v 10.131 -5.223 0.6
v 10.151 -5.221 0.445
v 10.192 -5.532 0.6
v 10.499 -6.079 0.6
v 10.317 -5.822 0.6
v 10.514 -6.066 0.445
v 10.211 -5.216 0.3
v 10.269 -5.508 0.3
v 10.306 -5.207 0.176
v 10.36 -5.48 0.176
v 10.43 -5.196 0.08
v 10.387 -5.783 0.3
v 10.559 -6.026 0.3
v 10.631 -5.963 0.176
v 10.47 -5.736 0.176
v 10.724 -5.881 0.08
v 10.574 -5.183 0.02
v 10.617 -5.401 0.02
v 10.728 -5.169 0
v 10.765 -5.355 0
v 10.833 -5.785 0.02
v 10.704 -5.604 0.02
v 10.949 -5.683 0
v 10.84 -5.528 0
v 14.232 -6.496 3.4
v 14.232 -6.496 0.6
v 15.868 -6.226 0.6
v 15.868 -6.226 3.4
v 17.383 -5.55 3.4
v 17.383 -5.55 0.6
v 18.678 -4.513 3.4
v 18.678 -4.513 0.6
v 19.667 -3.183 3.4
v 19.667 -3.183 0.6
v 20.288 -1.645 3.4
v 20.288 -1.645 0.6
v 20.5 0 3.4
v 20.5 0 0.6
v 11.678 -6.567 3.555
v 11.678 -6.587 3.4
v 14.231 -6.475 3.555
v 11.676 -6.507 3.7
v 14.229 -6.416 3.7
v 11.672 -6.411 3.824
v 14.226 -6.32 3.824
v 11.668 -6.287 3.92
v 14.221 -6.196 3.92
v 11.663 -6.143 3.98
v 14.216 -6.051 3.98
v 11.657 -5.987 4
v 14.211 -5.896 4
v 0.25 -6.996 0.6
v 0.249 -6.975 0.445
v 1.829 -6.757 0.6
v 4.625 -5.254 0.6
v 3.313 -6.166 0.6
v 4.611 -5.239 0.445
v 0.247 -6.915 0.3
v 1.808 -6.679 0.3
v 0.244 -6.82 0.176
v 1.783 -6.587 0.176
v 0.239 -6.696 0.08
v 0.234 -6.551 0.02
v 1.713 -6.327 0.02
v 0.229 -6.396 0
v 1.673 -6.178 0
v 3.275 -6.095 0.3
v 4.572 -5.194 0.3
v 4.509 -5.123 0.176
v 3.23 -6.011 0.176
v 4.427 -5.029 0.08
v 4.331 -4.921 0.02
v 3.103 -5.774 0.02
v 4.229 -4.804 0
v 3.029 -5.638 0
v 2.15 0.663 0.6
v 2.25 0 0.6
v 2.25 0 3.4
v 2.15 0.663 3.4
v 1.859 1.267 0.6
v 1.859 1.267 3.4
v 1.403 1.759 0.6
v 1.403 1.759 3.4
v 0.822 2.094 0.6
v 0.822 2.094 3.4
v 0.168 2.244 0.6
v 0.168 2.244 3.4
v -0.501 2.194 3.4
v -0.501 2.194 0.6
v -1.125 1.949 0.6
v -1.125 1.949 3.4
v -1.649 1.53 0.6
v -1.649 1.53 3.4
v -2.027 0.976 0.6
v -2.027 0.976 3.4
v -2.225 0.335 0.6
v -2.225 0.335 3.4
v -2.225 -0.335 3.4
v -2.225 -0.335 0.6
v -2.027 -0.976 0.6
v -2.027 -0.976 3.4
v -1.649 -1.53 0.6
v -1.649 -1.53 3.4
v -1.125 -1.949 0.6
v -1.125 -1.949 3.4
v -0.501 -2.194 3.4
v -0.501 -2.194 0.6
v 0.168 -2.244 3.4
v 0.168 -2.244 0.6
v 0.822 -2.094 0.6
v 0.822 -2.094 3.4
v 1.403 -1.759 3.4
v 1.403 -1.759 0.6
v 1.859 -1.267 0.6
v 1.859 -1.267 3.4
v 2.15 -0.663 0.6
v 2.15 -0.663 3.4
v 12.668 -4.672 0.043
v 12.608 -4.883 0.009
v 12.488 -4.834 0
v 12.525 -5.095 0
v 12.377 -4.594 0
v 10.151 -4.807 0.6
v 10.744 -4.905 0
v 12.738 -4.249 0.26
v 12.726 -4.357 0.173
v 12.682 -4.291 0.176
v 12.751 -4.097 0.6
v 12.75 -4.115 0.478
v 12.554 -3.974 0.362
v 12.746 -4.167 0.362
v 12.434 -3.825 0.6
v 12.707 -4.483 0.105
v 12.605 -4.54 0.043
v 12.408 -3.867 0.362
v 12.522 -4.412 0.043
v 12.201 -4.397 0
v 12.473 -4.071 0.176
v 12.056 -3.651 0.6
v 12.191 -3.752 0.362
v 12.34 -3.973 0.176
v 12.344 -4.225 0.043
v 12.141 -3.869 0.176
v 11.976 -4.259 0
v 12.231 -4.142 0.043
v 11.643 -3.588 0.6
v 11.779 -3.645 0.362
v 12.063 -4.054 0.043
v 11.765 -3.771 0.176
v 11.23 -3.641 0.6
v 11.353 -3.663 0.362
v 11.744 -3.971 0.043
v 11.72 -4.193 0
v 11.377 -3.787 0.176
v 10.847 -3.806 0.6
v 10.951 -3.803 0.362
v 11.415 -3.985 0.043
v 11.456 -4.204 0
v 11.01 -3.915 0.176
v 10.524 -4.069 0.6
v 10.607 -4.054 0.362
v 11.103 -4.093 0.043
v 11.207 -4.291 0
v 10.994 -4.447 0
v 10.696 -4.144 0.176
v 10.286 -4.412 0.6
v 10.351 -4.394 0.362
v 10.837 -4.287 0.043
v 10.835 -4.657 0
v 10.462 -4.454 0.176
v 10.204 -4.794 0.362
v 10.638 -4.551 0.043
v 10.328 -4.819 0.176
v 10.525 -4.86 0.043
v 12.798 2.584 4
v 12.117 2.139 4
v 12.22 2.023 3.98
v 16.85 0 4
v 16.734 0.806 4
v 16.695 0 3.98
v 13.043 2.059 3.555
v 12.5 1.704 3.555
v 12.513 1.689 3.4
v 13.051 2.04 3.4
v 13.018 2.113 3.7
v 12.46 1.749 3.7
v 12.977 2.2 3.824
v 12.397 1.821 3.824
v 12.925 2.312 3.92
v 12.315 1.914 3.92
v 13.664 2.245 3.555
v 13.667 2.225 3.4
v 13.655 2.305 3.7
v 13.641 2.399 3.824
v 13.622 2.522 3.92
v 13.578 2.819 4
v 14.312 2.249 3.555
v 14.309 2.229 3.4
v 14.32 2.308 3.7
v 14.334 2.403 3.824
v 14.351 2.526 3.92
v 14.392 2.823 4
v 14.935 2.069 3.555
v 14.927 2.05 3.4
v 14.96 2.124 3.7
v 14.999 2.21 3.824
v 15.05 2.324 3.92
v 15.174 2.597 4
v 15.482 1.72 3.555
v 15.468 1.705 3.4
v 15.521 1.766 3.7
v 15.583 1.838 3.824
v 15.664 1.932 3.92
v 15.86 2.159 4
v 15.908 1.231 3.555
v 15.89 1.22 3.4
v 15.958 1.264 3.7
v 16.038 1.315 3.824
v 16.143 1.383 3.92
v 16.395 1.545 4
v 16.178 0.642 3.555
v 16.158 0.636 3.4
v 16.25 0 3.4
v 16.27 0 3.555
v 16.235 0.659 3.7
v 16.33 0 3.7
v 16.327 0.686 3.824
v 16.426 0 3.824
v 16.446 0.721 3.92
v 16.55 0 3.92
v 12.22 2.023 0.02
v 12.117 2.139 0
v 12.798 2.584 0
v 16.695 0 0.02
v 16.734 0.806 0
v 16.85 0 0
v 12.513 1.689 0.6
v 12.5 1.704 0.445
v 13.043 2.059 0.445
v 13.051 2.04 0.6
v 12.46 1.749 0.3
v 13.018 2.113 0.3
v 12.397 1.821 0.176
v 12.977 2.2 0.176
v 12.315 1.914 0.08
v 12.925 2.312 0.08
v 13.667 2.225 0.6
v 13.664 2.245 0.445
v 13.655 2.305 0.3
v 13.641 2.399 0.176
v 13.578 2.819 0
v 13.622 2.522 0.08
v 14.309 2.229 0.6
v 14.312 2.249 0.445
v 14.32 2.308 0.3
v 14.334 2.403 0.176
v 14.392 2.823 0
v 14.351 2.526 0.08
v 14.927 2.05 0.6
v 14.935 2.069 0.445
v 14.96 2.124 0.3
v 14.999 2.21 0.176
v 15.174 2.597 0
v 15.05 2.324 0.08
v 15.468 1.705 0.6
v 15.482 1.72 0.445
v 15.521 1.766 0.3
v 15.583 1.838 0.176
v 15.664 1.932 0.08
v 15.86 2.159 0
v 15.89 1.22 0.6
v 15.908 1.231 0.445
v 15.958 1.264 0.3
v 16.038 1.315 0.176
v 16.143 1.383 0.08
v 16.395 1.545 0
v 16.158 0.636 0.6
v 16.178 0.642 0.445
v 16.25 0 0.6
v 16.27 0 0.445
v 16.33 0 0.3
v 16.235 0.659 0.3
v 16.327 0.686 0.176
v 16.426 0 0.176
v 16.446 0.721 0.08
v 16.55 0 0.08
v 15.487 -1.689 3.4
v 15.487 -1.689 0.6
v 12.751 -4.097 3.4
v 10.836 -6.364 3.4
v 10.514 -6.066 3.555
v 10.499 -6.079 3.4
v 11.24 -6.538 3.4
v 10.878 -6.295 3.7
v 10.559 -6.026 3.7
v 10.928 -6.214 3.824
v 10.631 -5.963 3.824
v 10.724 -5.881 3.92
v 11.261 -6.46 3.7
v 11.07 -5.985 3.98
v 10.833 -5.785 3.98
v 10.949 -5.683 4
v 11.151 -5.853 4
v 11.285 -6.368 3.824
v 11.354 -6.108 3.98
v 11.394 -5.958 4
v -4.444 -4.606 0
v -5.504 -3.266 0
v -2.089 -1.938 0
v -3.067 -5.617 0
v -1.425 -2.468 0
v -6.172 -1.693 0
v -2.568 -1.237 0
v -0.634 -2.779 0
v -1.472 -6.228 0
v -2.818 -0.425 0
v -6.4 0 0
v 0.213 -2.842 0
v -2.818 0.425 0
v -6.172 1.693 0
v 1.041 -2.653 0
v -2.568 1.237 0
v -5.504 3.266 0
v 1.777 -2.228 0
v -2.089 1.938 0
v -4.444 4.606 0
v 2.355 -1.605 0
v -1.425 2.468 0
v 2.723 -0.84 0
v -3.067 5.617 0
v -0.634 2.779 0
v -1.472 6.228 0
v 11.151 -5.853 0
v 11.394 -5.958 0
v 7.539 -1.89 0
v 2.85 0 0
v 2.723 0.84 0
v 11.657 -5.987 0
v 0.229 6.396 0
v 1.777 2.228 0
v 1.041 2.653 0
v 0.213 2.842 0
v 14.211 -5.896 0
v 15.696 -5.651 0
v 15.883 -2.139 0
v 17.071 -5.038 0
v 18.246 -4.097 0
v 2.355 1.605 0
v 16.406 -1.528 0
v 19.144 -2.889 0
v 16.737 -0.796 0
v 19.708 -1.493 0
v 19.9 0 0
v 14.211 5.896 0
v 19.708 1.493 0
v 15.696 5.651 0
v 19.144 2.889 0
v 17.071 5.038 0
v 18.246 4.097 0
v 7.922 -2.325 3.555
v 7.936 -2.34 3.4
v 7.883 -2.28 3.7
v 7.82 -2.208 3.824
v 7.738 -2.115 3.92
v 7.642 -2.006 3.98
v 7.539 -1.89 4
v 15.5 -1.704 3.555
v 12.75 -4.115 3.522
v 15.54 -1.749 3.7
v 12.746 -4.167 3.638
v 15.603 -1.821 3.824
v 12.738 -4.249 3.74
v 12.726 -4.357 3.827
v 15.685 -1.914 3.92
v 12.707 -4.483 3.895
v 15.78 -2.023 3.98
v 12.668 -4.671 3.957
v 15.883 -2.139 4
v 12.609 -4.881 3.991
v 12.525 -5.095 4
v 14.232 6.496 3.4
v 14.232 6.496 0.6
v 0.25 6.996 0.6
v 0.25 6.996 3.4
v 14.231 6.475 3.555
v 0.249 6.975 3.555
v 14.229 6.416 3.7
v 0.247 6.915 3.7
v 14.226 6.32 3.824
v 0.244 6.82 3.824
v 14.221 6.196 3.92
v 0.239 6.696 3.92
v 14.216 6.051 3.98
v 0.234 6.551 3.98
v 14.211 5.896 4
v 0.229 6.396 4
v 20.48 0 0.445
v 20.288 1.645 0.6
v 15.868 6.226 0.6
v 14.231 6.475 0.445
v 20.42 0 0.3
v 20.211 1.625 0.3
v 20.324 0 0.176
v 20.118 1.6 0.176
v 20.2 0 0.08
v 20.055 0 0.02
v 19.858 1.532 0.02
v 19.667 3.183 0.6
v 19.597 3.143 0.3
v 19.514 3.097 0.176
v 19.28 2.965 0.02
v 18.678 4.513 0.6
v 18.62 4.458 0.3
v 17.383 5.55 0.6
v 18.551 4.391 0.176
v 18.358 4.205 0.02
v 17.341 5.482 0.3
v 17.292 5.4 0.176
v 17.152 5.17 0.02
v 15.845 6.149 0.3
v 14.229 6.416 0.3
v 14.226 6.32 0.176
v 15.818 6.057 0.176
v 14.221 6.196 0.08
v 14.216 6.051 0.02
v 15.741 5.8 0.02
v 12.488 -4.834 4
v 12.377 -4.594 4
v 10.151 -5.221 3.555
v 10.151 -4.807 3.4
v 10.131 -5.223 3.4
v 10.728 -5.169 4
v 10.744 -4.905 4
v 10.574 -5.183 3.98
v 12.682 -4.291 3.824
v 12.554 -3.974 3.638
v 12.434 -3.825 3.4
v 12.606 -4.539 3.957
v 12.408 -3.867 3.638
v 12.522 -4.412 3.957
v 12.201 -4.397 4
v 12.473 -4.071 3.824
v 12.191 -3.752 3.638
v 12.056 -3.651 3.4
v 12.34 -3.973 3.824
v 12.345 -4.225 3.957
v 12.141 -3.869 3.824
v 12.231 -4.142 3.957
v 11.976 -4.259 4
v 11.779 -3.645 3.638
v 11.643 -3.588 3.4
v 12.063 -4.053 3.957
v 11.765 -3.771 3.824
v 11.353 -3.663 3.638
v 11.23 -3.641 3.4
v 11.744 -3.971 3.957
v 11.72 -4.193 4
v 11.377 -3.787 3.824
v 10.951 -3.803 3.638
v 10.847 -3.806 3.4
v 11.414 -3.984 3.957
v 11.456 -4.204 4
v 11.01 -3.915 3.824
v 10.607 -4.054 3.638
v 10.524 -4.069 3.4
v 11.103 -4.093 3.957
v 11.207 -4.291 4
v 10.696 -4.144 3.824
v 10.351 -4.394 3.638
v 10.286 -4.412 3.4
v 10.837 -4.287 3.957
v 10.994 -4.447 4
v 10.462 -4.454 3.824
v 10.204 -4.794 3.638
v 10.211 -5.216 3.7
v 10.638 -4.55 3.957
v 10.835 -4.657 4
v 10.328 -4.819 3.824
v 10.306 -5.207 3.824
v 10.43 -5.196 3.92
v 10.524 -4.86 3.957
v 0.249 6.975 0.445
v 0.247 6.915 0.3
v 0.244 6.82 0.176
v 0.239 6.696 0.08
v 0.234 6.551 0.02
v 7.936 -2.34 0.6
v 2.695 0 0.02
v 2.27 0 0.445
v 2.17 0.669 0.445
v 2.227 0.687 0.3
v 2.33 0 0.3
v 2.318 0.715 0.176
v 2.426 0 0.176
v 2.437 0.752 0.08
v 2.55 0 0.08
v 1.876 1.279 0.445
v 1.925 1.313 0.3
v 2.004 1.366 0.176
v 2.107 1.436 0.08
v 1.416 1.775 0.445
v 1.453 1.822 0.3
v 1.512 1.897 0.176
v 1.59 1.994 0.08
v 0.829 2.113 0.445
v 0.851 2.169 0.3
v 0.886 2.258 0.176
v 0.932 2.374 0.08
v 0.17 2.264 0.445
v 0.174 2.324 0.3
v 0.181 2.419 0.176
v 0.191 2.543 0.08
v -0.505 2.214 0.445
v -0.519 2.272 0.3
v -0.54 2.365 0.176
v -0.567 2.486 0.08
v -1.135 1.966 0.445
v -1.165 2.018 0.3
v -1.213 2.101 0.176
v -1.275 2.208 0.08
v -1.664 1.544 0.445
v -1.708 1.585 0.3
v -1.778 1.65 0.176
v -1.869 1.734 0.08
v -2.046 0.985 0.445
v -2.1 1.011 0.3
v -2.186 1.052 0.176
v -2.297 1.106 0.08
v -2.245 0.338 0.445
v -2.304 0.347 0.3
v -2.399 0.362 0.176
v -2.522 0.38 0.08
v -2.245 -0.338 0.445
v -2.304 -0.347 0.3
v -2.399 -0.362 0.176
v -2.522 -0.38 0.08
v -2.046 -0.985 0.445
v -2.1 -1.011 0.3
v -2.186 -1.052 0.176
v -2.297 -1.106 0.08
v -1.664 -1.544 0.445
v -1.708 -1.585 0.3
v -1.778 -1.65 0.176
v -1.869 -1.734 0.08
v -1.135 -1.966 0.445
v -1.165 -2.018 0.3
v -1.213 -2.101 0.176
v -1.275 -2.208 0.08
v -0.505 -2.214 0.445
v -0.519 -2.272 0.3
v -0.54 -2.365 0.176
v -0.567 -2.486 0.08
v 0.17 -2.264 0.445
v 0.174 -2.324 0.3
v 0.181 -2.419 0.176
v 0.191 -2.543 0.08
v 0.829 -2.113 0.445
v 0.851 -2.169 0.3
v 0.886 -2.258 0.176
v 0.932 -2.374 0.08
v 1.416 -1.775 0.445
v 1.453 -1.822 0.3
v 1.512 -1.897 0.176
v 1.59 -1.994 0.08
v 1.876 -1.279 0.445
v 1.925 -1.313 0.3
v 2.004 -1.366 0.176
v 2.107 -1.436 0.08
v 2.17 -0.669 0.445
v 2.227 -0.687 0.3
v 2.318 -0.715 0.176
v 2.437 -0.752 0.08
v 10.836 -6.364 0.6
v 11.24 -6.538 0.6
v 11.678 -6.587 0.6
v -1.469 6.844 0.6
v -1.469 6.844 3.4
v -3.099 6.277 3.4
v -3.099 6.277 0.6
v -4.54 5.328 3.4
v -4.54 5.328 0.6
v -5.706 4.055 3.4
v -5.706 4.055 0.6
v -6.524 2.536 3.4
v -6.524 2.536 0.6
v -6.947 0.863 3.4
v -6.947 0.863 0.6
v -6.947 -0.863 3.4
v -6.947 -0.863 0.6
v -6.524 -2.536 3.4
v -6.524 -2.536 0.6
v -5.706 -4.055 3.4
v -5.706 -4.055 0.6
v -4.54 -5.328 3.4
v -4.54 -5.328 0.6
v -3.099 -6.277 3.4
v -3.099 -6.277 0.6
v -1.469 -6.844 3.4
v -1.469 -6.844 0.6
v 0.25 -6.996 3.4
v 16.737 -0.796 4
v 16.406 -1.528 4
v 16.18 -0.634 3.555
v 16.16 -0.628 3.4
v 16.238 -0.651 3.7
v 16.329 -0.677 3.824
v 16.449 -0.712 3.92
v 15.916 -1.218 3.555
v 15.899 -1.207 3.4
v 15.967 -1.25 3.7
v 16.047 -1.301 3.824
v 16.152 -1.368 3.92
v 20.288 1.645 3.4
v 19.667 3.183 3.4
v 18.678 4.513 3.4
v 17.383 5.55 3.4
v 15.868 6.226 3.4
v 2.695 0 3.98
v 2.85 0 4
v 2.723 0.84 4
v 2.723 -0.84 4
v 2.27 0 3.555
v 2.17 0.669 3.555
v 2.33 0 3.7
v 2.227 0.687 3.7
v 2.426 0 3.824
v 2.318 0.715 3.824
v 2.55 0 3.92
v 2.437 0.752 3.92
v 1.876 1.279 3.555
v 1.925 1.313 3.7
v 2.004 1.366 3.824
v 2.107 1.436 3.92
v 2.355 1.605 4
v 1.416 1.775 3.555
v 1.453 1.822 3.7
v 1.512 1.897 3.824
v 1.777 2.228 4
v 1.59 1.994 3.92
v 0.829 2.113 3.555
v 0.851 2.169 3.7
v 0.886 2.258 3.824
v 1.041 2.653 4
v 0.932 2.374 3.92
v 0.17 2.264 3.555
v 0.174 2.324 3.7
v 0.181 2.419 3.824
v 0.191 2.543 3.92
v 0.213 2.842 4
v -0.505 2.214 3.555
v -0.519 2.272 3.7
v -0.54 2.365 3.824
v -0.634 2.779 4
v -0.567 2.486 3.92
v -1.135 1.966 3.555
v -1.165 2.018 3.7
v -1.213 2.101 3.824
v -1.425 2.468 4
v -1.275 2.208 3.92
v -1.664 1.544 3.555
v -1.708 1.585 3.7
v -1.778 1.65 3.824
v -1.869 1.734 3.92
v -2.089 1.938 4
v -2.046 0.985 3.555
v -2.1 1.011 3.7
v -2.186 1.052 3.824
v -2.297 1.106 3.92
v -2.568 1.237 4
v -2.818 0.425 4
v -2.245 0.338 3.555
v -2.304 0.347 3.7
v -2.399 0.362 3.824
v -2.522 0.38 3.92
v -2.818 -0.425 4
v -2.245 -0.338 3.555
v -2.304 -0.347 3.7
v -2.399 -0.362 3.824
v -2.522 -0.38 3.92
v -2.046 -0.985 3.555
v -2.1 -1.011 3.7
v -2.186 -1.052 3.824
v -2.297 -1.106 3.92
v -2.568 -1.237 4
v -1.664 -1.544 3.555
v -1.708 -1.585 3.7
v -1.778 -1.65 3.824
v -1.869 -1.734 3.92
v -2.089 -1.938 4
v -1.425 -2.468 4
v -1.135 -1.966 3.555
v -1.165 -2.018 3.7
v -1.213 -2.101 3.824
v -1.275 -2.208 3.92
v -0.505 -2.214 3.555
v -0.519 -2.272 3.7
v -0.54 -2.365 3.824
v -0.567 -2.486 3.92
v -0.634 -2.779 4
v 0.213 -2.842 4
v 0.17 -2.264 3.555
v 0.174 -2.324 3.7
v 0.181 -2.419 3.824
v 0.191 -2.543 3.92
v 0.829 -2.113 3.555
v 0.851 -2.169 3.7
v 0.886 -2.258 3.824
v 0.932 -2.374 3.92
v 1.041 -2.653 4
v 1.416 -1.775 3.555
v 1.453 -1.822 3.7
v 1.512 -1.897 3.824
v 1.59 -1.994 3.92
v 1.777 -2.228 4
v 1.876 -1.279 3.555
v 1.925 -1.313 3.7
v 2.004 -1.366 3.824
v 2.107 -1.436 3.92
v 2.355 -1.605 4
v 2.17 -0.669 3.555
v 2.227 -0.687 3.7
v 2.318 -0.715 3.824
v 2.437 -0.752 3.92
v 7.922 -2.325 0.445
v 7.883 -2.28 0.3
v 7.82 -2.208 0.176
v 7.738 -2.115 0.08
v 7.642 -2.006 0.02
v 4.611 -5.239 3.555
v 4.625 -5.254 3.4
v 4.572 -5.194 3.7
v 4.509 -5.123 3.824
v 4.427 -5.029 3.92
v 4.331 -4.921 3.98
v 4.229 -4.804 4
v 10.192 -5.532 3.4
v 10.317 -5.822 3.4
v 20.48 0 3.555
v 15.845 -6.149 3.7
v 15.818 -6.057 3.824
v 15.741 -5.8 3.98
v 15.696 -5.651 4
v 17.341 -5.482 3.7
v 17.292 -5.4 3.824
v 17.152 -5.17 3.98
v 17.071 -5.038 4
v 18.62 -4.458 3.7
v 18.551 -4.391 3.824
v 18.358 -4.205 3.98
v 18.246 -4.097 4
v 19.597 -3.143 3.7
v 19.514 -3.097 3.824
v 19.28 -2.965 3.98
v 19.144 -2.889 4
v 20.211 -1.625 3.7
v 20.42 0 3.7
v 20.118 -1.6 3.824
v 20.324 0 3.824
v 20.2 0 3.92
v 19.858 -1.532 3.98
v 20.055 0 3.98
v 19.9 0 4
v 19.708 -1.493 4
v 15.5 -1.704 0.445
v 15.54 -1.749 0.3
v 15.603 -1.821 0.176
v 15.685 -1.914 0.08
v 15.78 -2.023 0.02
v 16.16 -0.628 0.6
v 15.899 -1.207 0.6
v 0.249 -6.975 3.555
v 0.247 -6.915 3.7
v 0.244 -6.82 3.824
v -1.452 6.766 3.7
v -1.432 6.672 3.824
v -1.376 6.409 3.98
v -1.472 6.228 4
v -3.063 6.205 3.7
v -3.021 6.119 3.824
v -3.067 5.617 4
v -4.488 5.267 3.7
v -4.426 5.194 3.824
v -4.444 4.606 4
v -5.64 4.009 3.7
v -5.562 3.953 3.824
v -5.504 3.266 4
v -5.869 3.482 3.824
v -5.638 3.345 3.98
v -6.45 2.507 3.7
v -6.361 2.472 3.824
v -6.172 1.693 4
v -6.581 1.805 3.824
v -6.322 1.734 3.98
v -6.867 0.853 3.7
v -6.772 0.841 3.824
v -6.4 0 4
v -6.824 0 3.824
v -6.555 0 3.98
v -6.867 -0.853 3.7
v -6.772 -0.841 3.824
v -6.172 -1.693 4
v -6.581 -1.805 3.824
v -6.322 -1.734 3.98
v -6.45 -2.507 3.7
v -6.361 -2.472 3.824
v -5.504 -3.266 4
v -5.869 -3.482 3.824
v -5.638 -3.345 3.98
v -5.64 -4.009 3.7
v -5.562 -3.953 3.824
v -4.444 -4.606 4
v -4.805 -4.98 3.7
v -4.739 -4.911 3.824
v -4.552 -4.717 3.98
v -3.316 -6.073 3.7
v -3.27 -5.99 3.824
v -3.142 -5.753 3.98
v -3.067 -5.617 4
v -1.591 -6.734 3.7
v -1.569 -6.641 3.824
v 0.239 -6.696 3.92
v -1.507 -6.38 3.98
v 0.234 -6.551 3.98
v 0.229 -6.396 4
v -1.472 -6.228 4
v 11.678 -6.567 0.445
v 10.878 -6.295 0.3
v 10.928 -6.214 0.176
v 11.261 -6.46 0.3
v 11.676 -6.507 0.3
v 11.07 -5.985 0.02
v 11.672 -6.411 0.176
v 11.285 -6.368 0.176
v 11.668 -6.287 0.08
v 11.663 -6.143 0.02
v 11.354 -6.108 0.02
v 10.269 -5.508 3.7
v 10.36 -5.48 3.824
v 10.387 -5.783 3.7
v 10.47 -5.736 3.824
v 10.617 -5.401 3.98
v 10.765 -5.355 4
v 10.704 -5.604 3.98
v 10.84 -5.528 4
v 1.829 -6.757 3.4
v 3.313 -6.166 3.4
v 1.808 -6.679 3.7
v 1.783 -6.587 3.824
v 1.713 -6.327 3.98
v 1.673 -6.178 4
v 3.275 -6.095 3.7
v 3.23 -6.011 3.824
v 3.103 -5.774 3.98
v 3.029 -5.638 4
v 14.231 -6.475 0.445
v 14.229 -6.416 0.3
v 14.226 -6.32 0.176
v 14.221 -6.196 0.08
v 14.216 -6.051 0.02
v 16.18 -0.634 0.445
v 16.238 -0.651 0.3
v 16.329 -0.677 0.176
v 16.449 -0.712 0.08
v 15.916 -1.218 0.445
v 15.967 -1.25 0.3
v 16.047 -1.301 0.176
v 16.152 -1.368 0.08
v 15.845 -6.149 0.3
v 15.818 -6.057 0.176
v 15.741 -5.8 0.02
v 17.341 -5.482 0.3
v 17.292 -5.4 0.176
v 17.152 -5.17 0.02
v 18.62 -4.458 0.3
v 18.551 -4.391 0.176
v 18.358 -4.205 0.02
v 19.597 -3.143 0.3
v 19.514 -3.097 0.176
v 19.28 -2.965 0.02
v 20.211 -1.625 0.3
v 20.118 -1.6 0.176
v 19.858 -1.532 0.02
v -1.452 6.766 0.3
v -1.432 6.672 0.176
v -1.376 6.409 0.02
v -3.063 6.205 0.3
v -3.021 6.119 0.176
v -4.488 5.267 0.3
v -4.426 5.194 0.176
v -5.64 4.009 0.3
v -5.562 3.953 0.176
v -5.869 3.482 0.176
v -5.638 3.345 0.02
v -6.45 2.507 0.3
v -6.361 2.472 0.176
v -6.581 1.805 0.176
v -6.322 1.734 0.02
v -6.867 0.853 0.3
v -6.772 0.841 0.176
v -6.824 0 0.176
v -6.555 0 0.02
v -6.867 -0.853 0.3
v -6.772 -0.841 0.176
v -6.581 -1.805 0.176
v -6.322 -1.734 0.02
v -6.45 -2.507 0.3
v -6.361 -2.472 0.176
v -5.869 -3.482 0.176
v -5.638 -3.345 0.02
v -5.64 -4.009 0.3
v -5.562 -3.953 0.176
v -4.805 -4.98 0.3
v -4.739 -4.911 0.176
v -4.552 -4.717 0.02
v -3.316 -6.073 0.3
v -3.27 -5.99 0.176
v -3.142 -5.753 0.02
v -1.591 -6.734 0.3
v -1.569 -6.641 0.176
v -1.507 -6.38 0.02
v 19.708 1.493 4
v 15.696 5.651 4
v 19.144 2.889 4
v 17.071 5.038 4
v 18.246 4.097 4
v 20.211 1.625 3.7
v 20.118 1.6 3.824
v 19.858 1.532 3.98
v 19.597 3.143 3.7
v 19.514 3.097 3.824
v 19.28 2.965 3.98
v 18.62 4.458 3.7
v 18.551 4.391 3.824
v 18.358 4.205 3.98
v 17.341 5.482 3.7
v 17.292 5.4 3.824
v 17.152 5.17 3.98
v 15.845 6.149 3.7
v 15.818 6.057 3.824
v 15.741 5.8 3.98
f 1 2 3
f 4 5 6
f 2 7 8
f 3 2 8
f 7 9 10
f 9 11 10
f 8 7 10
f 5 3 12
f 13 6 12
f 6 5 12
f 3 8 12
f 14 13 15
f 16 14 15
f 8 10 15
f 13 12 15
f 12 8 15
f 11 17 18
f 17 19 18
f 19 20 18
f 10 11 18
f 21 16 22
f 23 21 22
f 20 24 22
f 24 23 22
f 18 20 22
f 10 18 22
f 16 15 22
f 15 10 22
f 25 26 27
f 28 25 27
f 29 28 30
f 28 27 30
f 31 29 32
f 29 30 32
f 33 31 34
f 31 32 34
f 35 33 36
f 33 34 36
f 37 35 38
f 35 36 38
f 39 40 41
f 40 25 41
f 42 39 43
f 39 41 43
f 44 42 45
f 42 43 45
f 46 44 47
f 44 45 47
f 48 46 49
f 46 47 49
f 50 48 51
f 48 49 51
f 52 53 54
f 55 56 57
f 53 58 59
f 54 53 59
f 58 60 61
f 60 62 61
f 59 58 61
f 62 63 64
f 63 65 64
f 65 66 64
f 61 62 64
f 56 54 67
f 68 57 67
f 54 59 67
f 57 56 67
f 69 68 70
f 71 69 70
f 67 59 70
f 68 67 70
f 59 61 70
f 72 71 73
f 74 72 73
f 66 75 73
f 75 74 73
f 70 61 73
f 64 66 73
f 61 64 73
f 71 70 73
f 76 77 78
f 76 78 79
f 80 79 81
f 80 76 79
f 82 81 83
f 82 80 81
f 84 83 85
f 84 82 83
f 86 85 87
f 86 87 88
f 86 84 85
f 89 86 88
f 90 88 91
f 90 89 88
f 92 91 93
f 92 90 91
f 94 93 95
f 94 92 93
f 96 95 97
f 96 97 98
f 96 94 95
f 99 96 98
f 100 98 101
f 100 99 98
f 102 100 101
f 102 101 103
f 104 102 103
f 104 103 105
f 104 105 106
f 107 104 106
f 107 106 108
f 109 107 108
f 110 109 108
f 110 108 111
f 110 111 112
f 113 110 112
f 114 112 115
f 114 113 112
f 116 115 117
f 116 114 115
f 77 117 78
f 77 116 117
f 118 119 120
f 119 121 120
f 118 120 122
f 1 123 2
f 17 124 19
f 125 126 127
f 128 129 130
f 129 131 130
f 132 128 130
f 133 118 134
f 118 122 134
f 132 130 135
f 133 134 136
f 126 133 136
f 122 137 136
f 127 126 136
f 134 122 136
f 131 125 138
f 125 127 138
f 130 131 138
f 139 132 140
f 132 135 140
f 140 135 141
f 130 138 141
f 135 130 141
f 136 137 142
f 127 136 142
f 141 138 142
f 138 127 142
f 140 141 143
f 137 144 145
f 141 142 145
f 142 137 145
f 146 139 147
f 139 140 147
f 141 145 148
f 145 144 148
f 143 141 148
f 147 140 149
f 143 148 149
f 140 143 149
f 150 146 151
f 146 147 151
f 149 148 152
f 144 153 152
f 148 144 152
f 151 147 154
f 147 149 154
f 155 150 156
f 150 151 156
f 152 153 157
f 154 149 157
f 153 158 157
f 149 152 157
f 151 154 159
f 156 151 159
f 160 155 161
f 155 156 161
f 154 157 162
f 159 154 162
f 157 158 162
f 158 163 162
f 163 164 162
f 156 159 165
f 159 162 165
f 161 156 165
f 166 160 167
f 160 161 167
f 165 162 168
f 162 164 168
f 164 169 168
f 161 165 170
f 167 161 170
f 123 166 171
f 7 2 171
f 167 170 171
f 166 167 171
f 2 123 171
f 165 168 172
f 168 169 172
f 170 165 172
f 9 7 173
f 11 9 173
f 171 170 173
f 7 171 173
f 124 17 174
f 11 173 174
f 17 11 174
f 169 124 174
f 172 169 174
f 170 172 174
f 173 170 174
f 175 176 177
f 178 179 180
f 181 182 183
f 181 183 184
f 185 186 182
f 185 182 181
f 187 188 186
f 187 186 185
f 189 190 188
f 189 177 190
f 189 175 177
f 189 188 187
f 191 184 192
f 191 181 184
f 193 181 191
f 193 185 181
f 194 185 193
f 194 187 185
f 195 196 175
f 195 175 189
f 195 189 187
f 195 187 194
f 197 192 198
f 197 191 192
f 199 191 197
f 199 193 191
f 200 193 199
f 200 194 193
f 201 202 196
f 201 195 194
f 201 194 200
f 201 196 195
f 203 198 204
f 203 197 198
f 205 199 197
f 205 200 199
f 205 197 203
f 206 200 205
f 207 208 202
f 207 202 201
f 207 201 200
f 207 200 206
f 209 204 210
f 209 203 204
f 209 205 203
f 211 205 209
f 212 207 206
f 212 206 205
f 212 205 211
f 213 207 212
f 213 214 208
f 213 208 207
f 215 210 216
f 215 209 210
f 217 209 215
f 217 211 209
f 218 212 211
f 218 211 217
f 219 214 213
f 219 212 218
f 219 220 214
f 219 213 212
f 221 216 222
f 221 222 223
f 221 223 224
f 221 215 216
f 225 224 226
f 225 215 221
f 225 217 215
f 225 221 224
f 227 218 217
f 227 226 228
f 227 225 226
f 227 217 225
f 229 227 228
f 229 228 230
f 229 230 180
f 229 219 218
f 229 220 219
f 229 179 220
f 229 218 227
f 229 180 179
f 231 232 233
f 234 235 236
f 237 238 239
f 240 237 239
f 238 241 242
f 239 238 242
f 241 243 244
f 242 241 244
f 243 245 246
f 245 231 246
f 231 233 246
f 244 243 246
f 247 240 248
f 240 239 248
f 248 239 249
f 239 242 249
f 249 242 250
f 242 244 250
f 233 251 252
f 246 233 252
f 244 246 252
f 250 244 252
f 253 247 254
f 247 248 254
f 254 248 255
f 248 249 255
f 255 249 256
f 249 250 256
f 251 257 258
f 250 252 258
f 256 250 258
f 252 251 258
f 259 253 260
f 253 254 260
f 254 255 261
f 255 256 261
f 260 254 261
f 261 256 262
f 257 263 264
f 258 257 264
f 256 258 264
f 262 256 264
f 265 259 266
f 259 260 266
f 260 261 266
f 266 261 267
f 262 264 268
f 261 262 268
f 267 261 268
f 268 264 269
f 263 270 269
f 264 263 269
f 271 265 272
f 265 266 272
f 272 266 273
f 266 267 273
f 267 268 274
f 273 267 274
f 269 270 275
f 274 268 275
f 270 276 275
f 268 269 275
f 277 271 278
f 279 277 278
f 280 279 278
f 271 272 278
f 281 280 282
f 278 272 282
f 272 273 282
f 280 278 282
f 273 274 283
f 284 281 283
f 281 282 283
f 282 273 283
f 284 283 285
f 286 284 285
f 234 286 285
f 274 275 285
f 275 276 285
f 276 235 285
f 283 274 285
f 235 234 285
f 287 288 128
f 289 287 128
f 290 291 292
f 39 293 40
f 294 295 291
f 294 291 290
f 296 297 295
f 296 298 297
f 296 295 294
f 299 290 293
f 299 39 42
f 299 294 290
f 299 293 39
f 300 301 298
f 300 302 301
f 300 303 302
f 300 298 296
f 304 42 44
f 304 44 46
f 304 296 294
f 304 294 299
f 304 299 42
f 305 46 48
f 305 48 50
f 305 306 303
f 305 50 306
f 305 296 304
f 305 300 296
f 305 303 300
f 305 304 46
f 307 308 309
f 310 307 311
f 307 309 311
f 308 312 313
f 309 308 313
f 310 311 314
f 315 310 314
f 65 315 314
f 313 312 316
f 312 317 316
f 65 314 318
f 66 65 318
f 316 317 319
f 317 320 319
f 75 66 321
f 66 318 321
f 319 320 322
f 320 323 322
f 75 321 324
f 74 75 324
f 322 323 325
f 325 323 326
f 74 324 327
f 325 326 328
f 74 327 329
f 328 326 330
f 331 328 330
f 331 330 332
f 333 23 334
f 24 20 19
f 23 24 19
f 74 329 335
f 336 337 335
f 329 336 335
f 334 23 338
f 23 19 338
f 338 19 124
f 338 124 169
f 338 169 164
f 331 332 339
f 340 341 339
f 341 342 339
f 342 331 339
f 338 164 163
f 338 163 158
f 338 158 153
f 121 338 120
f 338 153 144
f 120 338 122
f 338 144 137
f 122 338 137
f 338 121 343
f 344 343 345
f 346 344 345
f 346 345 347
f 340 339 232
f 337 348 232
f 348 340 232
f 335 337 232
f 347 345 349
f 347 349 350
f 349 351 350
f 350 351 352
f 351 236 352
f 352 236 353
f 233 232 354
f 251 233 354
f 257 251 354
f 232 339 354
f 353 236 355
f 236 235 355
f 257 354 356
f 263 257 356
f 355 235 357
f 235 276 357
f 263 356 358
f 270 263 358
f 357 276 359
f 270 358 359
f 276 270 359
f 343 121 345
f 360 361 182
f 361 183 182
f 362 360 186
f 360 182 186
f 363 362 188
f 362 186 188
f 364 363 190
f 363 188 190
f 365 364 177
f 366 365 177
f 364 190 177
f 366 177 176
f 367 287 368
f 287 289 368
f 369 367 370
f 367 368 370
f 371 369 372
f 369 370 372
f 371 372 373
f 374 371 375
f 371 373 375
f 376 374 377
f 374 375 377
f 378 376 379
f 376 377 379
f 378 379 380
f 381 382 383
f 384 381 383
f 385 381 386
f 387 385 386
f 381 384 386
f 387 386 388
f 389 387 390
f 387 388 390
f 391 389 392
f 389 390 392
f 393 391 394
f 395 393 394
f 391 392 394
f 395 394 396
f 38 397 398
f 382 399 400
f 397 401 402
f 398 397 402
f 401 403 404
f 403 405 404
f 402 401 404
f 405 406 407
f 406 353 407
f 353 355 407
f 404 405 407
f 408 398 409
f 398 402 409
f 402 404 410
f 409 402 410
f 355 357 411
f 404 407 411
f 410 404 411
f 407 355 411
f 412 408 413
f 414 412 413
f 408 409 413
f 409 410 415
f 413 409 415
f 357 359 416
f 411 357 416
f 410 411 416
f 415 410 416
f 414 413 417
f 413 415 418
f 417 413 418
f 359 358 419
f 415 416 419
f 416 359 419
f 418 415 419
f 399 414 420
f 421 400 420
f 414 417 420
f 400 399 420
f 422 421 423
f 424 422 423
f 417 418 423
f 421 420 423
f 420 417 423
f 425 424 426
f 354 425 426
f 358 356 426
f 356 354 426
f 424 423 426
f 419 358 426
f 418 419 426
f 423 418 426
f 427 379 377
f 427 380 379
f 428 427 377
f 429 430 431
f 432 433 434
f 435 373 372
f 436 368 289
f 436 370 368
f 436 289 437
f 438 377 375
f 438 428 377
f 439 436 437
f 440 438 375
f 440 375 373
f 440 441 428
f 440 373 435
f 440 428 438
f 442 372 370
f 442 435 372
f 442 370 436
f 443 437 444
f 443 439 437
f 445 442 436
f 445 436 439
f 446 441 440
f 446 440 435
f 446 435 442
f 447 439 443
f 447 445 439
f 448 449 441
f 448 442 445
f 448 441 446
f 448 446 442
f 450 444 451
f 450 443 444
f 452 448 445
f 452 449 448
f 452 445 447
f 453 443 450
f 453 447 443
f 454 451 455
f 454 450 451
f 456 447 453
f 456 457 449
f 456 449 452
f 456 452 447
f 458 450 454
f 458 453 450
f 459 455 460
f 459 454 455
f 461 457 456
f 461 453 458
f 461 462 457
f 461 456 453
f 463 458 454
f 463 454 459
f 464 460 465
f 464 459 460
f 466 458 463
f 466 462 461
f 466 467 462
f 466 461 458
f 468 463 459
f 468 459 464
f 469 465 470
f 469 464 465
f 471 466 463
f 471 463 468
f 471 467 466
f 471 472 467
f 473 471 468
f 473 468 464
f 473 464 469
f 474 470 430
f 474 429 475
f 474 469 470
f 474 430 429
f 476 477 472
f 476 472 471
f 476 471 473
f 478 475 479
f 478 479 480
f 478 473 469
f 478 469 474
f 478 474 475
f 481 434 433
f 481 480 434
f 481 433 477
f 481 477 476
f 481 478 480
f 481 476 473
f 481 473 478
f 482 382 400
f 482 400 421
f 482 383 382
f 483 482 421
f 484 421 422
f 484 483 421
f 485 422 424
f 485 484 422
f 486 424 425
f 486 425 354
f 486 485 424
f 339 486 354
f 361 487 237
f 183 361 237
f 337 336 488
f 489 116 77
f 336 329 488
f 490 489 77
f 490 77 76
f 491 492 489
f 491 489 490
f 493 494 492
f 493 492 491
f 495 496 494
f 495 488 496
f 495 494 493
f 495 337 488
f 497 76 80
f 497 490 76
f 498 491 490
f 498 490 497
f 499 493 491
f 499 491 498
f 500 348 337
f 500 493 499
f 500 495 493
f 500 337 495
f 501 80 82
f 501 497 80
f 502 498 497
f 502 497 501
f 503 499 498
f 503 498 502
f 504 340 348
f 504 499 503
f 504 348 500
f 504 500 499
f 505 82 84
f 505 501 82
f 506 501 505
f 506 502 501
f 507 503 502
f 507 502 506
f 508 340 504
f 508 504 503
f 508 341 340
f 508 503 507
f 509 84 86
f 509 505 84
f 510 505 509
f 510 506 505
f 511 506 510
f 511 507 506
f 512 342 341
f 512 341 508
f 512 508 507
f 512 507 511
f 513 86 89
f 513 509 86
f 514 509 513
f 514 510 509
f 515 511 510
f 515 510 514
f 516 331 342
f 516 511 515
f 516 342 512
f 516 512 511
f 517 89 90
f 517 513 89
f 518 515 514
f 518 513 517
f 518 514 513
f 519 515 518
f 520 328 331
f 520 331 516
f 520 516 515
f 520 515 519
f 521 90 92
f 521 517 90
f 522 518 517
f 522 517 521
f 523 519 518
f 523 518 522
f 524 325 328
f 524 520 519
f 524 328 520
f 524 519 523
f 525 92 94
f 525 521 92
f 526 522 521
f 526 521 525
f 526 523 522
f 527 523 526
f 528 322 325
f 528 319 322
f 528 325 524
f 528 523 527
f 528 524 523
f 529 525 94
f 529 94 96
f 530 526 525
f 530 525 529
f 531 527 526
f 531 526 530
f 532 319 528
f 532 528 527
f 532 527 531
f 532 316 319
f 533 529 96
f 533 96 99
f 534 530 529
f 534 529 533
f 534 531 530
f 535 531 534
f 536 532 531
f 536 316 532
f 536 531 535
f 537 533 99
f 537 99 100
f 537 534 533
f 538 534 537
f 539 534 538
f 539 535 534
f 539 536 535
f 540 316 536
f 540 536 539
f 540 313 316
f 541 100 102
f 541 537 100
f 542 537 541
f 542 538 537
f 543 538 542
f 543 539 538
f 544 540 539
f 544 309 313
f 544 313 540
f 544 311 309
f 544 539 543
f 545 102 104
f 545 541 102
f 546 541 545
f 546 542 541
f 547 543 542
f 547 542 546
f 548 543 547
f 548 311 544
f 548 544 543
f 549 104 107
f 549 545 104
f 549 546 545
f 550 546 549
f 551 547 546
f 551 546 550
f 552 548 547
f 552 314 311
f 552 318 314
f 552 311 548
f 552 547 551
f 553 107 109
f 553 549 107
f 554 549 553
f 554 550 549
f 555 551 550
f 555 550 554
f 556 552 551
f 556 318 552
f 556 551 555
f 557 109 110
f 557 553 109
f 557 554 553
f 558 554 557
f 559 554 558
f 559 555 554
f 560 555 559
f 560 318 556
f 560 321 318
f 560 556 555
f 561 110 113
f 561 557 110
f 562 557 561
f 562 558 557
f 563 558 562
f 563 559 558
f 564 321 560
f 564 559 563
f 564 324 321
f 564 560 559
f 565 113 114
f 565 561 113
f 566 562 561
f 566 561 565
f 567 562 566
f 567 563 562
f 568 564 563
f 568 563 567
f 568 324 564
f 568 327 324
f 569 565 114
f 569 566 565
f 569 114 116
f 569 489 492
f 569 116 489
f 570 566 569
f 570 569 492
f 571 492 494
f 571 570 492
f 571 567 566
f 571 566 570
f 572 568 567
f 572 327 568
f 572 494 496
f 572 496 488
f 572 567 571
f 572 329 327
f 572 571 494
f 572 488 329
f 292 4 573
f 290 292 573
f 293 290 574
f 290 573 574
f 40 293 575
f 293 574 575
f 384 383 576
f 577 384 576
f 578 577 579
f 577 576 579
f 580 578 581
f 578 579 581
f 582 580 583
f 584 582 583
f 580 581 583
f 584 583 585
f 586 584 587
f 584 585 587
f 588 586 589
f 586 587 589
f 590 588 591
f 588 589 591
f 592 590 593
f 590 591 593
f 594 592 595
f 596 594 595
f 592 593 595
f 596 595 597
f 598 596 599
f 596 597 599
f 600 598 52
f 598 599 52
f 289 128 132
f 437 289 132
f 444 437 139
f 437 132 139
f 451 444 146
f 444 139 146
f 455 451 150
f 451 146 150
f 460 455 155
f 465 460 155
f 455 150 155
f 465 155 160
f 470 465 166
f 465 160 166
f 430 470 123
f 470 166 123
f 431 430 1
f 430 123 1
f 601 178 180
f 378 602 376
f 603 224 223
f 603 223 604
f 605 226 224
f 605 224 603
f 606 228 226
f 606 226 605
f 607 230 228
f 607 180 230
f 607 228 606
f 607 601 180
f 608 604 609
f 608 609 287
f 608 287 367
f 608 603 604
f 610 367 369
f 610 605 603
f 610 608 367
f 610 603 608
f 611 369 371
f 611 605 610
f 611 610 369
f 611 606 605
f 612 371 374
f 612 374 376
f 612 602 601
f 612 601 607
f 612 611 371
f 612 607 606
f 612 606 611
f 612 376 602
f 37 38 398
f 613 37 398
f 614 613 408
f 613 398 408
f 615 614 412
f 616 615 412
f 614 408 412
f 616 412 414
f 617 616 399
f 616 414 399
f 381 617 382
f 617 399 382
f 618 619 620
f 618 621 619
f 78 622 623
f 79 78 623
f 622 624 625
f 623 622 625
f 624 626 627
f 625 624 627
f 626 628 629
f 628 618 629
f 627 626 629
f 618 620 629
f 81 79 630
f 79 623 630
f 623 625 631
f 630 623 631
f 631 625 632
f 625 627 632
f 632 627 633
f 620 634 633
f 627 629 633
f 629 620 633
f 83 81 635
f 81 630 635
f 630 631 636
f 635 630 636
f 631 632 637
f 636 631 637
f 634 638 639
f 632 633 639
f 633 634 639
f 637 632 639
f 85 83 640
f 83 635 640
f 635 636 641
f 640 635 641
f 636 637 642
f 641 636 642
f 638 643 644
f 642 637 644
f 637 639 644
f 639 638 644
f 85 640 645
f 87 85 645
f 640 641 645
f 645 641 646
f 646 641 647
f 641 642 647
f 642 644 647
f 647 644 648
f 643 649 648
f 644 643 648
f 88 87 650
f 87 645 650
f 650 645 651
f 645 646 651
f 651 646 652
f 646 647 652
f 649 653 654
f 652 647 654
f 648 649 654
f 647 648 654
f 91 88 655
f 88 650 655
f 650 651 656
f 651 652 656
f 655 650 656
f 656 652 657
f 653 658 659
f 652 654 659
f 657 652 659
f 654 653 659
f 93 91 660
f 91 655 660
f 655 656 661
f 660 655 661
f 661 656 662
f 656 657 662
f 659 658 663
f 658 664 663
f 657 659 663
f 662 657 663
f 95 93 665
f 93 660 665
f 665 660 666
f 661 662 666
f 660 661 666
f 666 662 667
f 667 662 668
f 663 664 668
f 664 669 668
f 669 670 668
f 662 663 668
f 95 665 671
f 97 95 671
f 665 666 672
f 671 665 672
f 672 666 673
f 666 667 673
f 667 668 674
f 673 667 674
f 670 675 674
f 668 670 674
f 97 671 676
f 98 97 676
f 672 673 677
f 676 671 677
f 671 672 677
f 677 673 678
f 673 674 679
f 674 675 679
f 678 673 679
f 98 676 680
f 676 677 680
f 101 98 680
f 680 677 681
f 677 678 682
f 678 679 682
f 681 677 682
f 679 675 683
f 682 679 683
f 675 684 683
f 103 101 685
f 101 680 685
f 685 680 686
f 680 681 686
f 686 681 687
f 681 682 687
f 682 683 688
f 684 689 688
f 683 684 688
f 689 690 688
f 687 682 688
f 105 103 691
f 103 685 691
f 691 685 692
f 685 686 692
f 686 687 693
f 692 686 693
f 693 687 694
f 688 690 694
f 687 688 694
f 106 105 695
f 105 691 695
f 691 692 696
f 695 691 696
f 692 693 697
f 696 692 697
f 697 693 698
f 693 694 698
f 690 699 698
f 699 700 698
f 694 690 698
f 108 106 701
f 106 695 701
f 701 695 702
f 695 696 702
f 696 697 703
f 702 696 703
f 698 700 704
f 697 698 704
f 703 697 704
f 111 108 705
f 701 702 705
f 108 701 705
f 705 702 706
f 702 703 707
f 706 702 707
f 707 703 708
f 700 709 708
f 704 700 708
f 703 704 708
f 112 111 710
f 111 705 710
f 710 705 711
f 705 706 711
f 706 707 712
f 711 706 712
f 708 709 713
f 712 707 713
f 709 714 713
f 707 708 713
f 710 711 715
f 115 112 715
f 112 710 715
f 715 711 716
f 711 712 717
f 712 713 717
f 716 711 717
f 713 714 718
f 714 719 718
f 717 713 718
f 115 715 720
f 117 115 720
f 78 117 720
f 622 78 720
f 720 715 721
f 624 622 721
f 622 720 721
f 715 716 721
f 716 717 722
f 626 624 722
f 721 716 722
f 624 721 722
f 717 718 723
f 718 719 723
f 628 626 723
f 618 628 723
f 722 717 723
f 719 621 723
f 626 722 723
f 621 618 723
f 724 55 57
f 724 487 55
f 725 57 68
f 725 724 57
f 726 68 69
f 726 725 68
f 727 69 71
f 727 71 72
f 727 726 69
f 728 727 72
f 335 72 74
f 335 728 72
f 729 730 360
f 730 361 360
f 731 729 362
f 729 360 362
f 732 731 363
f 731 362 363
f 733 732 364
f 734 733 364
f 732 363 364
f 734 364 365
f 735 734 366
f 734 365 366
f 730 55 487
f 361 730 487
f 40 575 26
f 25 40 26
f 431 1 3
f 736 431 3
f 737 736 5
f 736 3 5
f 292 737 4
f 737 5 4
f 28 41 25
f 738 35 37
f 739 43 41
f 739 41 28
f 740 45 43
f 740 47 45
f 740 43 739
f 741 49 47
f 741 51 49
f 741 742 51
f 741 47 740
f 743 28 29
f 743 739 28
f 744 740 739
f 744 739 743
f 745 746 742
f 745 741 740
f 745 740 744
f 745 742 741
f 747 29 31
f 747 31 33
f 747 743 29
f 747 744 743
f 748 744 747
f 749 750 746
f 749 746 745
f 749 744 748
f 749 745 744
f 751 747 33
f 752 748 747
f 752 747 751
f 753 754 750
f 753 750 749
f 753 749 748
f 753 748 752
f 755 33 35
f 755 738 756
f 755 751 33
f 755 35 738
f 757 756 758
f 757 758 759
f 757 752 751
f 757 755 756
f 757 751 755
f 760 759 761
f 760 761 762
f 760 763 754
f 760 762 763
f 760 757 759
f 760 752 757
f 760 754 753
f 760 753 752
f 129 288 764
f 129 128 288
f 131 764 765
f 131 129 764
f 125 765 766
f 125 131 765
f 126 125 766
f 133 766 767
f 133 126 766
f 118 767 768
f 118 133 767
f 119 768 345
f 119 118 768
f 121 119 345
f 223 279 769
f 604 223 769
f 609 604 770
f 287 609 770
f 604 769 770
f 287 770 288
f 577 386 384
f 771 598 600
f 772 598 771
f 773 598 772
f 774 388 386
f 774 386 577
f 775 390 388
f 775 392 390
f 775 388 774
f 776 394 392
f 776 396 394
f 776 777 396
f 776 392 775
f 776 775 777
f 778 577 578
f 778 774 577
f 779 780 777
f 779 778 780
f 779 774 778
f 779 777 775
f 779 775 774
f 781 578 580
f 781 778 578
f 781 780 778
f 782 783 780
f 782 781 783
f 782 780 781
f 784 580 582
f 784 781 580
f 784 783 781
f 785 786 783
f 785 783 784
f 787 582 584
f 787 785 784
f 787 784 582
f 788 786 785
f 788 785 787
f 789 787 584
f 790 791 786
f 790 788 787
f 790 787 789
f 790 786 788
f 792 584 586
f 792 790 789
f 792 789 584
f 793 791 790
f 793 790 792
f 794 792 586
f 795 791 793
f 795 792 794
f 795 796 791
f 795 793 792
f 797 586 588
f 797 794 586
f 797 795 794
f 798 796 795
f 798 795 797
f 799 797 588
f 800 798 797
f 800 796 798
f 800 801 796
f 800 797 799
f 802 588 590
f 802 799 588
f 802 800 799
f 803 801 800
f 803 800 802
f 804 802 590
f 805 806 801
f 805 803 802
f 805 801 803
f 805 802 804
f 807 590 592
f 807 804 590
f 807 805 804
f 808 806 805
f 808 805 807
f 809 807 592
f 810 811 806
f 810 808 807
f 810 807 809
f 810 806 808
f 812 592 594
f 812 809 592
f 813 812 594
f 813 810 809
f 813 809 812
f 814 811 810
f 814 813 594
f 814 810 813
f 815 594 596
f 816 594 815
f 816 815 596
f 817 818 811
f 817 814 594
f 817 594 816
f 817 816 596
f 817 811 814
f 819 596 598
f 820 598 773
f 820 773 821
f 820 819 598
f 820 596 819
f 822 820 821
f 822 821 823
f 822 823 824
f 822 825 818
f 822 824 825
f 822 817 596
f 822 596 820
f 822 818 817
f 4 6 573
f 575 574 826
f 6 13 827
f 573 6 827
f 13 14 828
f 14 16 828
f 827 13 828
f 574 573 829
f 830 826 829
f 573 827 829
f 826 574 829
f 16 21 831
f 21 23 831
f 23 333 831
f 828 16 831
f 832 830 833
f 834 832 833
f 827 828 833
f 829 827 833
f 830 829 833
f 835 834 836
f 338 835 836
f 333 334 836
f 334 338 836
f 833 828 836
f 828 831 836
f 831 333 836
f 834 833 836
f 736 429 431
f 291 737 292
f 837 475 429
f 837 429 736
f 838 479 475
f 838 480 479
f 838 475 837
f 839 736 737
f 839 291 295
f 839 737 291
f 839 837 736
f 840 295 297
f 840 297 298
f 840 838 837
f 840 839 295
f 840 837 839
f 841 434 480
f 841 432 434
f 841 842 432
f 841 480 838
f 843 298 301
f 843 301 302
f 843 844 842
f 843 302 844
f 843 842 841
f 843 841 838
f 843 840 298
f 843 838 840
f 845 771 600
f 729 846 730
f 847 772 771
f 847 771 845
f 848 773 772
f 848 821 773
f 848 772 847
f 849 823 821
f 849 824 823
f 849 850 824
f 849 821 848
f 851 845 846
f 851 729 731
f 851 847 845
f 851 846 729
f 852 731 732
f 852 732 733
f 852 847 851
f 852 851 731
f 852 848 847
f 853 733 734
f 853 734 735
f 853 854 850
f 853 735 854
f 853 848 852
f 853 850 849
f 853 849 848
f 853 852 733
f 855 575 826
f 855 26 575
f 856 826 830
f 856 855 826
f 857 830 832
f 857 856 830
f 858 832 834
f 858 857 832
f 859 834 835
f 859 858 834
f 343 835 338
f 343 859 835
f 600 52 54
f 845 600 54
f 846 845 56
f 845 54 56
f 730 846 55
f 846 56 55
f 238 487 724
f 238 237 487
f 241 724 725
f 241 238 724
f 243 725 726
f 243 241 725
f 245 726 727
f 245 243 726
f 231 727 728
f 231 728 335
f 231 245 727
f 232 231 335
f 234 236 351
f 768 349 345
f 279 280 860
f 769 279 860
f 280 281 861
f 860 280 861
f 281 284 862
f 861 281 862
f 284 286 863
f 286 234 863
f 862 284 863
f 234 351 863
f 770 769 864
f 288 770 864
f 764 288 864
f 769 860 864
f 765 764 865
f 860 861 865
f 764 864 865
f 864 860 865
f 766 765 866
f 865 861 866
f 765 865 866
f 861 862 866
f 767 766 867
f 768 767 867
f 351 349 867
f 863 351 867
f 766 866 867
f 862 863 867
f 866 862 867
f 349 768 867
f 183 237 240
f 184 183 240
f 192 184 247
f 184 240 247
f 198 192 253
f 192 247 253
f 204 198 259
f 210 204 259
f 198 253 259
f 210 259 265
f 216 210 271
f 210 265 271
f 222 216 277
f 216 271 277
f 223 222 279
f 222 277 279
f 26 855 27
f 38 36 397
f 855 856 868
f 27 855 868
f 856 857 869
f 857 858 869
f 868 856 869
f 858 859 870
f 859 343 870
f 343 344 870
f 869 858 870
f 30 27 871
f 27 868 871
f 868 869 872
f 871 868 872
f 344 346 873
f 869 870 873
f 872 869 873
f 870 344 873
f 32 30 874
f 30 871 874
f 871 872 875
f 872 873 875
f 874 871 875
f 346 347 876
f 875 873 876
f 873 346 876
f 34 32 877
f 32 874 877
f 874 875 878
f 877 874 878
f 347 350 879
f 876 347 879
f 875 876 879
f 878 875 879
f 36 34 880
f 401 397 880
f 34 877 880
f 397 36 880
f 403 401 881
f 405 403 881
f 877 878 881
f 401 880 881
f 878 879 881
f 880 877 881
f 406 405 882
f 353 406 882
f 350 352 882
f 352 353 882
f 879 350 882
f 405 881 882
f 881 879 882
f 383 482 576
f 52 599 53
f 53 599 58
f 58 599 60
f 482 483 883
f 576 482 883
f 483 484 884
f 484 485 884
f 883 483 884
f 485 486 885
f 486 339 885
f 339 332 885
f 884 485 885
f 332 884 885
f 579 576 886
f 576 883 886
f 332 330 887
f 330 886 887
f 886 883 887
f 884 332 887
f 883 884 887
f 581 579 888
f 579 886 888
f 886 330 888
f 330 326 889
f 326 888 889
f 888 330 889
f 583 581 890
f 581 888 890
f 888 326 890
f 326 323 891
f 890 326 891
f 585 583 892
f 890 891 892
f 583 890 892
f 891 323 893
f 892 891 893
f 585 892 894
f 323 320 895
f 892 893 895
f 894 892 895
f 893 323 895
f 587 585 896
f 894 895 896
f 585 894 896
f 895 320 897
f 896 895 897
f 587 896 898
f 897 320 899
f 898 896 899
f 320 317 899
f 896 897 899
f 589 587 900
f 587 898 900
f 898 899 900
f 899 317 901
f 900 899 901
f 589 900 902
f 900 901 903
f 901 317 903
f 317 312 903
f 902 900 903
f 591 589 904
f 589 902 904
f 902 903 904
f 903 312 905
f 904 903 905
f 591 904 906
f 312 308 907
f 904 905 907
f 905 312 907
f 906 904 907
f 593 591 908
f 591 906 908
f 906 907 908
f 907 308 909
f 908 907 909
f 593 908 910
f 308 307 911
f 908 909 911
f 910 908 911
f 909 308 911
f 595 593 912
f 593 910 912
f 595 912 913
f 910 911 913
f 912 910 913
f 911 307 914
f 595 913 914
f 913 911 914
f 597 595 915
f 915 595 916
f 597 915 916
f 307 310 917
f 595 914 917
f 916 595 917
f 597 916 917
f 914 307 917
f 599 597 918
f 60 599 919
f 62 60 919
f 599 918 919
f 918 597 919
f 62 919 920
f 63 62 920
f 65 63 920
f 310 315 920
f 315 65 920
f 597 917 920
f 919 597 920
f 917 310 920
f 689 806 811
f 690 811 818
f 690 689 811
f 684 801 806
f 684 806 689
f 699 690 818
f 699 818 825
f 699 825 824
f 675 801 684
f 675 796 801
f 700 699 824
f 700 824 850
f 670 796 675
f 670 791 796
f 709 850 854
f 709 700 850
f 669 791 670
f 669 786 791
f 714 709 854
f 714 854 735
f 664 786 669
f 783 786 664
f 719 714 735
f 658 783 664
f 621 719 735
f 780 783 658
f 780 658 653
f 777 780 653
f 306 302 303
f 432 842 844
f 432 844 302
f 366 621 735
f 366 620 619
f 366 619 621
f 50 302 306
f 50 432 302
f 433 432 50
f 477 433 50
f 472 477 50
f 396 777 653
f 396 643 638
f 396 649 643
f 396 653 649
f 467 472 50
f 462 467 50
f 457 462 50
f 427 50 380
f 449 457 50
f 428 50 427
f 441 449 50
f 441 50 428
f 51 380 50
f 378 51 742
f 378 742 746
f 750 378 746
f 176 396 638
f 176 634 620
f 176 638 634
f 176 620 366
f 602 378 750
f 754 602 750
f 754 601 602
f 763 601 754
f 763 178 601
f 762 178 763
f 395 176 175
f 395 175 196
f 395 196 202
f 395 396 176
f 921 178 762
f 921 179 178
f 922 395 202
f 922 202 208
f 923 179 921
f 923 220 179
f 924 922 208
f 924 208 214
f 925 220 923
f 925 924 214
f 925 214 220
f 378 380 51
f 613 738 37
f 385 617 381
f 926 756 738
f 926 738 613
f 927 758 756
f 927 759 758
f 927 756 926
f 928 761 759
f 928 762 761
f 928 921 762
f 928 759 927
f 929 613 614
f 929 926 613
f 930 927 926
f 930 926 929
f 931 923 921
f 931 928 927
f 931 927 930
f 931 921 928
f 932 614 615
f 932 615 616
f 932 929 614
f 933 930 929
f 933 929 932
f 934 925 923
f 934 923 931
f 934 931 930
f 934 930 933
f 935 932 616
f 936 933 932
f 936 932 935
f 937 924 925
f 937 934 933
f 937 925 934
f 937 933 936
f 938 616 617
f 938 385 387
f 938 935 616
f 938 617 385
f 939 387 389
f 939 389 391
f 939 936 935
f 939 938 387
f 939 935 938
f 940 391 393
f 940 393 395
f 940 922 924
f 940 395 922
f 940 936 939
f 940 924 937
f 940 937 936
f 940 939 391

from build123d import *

# Parameters (mm, degrees)
F0_R     = 2.25
F1_DEPTH = 4
F2_R     = 0.6


with BuildPart() as f1:
    # F0 (on Top) → F1 (new body)
    with BuildSketch(Plane.XY):
        with BuildLine():
            ThreePointArc((4.625, -5.2544623892), (6.3786754111, -2.8831406487), (7, 0))
            ThreePointArc((7, 0), (5.0373604199, 4.8605555238), (0.25, 6.9955342898))
            ThreePointArc((0.25, 6.9955342898), (-7, 0), (0.25, -6.9955342898))
            ThreePointArc((0.25, -6.9955342898), (2.5882888345, -6.5039035132), (4.625, -5.2544623892))
        make_face()
        Circle(F0_R, mode=Mode.SUBTRACT)
        with BuildLine():
            ThreePointArc((0.25, 6.9955342898), (5.0373604199, 4.8605555238), (7, 0))
            ThreePointArc((7, 0), (6.3786754111, -2.8831406487), (4.625, -5.2544623892))
            Line((4.625, -5.2544623892), (7.9358887854, -2.3402040888))
            ThreePointArc((7.9358887854, -2.3402040888), (8.7064245412, 3.7720099233), (14.2321428571, 6.4958532691))
            Line((14.2321428571, 6.4958532691), (0.25, 6.9955342898))
        make_face()
        with BuildLine():
            ThreePointArc((20.5, 0), (18.6775489613, 4.5133729864), (14.2321428571, 6.4958532691))
            ThreePointArc((14.2321428571, 6.4958532691), (8.7064245412, 3.7720099233), (7.9358887854, -2.3402040888))
            Line((7.9358887854, -2.3402040888), (12.5133928571, 1.6889343394))
            ThreePointArc((12.5133928571, 1.6889343394), (14.9267237799, 2.050288525), (16.25, 0))
            ThreePointArc((16.25, 0), (16.050288525, -0.9267237799), (15.4866071429, -1.6889343394))
            Line((15.4866071429, -1.6889343394), (12.7508021178, -4.0970014837))
            ThreePointArc((12.7508021178, -4.0970014837), (13.0282229506, -4.5584194121), (13.1248458916, -5.0880729123))
            ThreePointArc((13.1248458916, -5.0880729123), (12.954090315, -5.7831335304), (12.4807002077, -6.3199468464))
            ThreePointArc((12.4807002077, -6.3199468464), (13.3504393706, -6.4674624845), (14.2321428571, -6.4958532691))
            ThreePointArc((14.2321428571, -6.4958532691), (18.6775489613, -4.5133729864), (20.5, 0))
        make_face()
        with BuildLine():
            ThreePointArc((12.7508021178, -4.0970014837), (11.0325218522, -3.7099755891), (10.1309316841, -5.2230556542))
            ThreePointArc((10.1309316841, -5.2230556542), (10.5112266428, -5.4843833256), (10.9091030711, -5.7180727676))
            Line((10.9091030711, -5.7180727676), (12.7508021178, -4.0970014837))
        make_face()
        with BuildLine():
            ThreePointArc((10.9091030711, -5.7180727676), (10.5112266428, -5.4843833256), (10.1309316841, -5.2230556542))
            ThreePointArc((10.1309316841, -5.2230556542), (10.2467485683, -5.6803969517), (10.4988896653, -6.0791443409))
            Line((10.4988896653, -6.0791443409), (10.9091030711, -5.7180727676))
        make_face()
        with BuildLine():
            ThreePointArc((10.4988896653, -6.0791443409), (11.0315406631, -6.4657480939), (11.6784173011, -6.5871159751))
            ThreePointArc((11.6784173011, -6.5871159751), (12.098774814, -6.5112353684), (12.4807002077, -6.3199468464))
            ThreePointArc((12.4807002077, -6.3199468464), (11.6753405511, -6.0700871861), (10.9091030711, -5.7180727676))
            Line((10.9091030711, -5.7180727676), (10.4988896653, -6.0791443409))
        make_face()
        with BuildLine():
            Line((12.7508021178, -4.0970014837), (10.9091030711, -5.7180727676))
            ThreePointArc((10.9091030711, -5.7180727676), (11.6753405511, -6.0700871861), (12.4807002077, -6.3199468464))
            ThreePointArc((12.4807002077, -6.3199468464), (12.954090315, -5.7831335304), (13.1248458916, -5.0880729123))
            ThreePointArc((13.1248458916, -5.0880729123), (13.0282229506, -4.5584194121), (12.7508021178, -4.0970014837))
        make_face()
        with BuildLine():
            ThreePointArc((12.4807002077, -6.3199468464), (12.098774814, -6.5112353684), (11.6784173011, -6.5871159751))
            Line((11.6784173011, -6.5871159751), (14.2321428571, -6.4958532691))
            ThreePointArc((14.2321428571, -6.4958532691), (13.3504393706, -6.4674624845), (12.4807002077, -6.3199468464))
        make_face()
    extrude(amount=F1_DEPTH)

    # F2
    f2_edges = [f1.edges().sort_by_distance(p)[0] for p in [
        (-6.592193, -2.354355, 0),
        (8.569196, -1.782764, 0),
        (15.688934, 1.486607, 0),
        (14.118705, -2.892968, 0),
        (10.247171, -4.494768, 0),
        (12.95528, -6.541485, 0),
        (20.5, 0, 0),
        (7.241071, 6.745694, 0),
        (-2.25, 0, 0),
        (-6.592193, -2.354355, 4),
        (8.569196, -1.782764, 4),
        (15.688934, 1.486607, 4),
        (14.118705, -2.892968, 4),
        (10.247171, -4.494768, 4),
        (12.95528, -6.541485, 4),
        (20.5, 0, 4),
        (7.241071, 6.745694, 4),
        (-2.25, 0, 4),
    ]]
    fillet(f2_edges, radius=F2_R)


solid = f1.part
